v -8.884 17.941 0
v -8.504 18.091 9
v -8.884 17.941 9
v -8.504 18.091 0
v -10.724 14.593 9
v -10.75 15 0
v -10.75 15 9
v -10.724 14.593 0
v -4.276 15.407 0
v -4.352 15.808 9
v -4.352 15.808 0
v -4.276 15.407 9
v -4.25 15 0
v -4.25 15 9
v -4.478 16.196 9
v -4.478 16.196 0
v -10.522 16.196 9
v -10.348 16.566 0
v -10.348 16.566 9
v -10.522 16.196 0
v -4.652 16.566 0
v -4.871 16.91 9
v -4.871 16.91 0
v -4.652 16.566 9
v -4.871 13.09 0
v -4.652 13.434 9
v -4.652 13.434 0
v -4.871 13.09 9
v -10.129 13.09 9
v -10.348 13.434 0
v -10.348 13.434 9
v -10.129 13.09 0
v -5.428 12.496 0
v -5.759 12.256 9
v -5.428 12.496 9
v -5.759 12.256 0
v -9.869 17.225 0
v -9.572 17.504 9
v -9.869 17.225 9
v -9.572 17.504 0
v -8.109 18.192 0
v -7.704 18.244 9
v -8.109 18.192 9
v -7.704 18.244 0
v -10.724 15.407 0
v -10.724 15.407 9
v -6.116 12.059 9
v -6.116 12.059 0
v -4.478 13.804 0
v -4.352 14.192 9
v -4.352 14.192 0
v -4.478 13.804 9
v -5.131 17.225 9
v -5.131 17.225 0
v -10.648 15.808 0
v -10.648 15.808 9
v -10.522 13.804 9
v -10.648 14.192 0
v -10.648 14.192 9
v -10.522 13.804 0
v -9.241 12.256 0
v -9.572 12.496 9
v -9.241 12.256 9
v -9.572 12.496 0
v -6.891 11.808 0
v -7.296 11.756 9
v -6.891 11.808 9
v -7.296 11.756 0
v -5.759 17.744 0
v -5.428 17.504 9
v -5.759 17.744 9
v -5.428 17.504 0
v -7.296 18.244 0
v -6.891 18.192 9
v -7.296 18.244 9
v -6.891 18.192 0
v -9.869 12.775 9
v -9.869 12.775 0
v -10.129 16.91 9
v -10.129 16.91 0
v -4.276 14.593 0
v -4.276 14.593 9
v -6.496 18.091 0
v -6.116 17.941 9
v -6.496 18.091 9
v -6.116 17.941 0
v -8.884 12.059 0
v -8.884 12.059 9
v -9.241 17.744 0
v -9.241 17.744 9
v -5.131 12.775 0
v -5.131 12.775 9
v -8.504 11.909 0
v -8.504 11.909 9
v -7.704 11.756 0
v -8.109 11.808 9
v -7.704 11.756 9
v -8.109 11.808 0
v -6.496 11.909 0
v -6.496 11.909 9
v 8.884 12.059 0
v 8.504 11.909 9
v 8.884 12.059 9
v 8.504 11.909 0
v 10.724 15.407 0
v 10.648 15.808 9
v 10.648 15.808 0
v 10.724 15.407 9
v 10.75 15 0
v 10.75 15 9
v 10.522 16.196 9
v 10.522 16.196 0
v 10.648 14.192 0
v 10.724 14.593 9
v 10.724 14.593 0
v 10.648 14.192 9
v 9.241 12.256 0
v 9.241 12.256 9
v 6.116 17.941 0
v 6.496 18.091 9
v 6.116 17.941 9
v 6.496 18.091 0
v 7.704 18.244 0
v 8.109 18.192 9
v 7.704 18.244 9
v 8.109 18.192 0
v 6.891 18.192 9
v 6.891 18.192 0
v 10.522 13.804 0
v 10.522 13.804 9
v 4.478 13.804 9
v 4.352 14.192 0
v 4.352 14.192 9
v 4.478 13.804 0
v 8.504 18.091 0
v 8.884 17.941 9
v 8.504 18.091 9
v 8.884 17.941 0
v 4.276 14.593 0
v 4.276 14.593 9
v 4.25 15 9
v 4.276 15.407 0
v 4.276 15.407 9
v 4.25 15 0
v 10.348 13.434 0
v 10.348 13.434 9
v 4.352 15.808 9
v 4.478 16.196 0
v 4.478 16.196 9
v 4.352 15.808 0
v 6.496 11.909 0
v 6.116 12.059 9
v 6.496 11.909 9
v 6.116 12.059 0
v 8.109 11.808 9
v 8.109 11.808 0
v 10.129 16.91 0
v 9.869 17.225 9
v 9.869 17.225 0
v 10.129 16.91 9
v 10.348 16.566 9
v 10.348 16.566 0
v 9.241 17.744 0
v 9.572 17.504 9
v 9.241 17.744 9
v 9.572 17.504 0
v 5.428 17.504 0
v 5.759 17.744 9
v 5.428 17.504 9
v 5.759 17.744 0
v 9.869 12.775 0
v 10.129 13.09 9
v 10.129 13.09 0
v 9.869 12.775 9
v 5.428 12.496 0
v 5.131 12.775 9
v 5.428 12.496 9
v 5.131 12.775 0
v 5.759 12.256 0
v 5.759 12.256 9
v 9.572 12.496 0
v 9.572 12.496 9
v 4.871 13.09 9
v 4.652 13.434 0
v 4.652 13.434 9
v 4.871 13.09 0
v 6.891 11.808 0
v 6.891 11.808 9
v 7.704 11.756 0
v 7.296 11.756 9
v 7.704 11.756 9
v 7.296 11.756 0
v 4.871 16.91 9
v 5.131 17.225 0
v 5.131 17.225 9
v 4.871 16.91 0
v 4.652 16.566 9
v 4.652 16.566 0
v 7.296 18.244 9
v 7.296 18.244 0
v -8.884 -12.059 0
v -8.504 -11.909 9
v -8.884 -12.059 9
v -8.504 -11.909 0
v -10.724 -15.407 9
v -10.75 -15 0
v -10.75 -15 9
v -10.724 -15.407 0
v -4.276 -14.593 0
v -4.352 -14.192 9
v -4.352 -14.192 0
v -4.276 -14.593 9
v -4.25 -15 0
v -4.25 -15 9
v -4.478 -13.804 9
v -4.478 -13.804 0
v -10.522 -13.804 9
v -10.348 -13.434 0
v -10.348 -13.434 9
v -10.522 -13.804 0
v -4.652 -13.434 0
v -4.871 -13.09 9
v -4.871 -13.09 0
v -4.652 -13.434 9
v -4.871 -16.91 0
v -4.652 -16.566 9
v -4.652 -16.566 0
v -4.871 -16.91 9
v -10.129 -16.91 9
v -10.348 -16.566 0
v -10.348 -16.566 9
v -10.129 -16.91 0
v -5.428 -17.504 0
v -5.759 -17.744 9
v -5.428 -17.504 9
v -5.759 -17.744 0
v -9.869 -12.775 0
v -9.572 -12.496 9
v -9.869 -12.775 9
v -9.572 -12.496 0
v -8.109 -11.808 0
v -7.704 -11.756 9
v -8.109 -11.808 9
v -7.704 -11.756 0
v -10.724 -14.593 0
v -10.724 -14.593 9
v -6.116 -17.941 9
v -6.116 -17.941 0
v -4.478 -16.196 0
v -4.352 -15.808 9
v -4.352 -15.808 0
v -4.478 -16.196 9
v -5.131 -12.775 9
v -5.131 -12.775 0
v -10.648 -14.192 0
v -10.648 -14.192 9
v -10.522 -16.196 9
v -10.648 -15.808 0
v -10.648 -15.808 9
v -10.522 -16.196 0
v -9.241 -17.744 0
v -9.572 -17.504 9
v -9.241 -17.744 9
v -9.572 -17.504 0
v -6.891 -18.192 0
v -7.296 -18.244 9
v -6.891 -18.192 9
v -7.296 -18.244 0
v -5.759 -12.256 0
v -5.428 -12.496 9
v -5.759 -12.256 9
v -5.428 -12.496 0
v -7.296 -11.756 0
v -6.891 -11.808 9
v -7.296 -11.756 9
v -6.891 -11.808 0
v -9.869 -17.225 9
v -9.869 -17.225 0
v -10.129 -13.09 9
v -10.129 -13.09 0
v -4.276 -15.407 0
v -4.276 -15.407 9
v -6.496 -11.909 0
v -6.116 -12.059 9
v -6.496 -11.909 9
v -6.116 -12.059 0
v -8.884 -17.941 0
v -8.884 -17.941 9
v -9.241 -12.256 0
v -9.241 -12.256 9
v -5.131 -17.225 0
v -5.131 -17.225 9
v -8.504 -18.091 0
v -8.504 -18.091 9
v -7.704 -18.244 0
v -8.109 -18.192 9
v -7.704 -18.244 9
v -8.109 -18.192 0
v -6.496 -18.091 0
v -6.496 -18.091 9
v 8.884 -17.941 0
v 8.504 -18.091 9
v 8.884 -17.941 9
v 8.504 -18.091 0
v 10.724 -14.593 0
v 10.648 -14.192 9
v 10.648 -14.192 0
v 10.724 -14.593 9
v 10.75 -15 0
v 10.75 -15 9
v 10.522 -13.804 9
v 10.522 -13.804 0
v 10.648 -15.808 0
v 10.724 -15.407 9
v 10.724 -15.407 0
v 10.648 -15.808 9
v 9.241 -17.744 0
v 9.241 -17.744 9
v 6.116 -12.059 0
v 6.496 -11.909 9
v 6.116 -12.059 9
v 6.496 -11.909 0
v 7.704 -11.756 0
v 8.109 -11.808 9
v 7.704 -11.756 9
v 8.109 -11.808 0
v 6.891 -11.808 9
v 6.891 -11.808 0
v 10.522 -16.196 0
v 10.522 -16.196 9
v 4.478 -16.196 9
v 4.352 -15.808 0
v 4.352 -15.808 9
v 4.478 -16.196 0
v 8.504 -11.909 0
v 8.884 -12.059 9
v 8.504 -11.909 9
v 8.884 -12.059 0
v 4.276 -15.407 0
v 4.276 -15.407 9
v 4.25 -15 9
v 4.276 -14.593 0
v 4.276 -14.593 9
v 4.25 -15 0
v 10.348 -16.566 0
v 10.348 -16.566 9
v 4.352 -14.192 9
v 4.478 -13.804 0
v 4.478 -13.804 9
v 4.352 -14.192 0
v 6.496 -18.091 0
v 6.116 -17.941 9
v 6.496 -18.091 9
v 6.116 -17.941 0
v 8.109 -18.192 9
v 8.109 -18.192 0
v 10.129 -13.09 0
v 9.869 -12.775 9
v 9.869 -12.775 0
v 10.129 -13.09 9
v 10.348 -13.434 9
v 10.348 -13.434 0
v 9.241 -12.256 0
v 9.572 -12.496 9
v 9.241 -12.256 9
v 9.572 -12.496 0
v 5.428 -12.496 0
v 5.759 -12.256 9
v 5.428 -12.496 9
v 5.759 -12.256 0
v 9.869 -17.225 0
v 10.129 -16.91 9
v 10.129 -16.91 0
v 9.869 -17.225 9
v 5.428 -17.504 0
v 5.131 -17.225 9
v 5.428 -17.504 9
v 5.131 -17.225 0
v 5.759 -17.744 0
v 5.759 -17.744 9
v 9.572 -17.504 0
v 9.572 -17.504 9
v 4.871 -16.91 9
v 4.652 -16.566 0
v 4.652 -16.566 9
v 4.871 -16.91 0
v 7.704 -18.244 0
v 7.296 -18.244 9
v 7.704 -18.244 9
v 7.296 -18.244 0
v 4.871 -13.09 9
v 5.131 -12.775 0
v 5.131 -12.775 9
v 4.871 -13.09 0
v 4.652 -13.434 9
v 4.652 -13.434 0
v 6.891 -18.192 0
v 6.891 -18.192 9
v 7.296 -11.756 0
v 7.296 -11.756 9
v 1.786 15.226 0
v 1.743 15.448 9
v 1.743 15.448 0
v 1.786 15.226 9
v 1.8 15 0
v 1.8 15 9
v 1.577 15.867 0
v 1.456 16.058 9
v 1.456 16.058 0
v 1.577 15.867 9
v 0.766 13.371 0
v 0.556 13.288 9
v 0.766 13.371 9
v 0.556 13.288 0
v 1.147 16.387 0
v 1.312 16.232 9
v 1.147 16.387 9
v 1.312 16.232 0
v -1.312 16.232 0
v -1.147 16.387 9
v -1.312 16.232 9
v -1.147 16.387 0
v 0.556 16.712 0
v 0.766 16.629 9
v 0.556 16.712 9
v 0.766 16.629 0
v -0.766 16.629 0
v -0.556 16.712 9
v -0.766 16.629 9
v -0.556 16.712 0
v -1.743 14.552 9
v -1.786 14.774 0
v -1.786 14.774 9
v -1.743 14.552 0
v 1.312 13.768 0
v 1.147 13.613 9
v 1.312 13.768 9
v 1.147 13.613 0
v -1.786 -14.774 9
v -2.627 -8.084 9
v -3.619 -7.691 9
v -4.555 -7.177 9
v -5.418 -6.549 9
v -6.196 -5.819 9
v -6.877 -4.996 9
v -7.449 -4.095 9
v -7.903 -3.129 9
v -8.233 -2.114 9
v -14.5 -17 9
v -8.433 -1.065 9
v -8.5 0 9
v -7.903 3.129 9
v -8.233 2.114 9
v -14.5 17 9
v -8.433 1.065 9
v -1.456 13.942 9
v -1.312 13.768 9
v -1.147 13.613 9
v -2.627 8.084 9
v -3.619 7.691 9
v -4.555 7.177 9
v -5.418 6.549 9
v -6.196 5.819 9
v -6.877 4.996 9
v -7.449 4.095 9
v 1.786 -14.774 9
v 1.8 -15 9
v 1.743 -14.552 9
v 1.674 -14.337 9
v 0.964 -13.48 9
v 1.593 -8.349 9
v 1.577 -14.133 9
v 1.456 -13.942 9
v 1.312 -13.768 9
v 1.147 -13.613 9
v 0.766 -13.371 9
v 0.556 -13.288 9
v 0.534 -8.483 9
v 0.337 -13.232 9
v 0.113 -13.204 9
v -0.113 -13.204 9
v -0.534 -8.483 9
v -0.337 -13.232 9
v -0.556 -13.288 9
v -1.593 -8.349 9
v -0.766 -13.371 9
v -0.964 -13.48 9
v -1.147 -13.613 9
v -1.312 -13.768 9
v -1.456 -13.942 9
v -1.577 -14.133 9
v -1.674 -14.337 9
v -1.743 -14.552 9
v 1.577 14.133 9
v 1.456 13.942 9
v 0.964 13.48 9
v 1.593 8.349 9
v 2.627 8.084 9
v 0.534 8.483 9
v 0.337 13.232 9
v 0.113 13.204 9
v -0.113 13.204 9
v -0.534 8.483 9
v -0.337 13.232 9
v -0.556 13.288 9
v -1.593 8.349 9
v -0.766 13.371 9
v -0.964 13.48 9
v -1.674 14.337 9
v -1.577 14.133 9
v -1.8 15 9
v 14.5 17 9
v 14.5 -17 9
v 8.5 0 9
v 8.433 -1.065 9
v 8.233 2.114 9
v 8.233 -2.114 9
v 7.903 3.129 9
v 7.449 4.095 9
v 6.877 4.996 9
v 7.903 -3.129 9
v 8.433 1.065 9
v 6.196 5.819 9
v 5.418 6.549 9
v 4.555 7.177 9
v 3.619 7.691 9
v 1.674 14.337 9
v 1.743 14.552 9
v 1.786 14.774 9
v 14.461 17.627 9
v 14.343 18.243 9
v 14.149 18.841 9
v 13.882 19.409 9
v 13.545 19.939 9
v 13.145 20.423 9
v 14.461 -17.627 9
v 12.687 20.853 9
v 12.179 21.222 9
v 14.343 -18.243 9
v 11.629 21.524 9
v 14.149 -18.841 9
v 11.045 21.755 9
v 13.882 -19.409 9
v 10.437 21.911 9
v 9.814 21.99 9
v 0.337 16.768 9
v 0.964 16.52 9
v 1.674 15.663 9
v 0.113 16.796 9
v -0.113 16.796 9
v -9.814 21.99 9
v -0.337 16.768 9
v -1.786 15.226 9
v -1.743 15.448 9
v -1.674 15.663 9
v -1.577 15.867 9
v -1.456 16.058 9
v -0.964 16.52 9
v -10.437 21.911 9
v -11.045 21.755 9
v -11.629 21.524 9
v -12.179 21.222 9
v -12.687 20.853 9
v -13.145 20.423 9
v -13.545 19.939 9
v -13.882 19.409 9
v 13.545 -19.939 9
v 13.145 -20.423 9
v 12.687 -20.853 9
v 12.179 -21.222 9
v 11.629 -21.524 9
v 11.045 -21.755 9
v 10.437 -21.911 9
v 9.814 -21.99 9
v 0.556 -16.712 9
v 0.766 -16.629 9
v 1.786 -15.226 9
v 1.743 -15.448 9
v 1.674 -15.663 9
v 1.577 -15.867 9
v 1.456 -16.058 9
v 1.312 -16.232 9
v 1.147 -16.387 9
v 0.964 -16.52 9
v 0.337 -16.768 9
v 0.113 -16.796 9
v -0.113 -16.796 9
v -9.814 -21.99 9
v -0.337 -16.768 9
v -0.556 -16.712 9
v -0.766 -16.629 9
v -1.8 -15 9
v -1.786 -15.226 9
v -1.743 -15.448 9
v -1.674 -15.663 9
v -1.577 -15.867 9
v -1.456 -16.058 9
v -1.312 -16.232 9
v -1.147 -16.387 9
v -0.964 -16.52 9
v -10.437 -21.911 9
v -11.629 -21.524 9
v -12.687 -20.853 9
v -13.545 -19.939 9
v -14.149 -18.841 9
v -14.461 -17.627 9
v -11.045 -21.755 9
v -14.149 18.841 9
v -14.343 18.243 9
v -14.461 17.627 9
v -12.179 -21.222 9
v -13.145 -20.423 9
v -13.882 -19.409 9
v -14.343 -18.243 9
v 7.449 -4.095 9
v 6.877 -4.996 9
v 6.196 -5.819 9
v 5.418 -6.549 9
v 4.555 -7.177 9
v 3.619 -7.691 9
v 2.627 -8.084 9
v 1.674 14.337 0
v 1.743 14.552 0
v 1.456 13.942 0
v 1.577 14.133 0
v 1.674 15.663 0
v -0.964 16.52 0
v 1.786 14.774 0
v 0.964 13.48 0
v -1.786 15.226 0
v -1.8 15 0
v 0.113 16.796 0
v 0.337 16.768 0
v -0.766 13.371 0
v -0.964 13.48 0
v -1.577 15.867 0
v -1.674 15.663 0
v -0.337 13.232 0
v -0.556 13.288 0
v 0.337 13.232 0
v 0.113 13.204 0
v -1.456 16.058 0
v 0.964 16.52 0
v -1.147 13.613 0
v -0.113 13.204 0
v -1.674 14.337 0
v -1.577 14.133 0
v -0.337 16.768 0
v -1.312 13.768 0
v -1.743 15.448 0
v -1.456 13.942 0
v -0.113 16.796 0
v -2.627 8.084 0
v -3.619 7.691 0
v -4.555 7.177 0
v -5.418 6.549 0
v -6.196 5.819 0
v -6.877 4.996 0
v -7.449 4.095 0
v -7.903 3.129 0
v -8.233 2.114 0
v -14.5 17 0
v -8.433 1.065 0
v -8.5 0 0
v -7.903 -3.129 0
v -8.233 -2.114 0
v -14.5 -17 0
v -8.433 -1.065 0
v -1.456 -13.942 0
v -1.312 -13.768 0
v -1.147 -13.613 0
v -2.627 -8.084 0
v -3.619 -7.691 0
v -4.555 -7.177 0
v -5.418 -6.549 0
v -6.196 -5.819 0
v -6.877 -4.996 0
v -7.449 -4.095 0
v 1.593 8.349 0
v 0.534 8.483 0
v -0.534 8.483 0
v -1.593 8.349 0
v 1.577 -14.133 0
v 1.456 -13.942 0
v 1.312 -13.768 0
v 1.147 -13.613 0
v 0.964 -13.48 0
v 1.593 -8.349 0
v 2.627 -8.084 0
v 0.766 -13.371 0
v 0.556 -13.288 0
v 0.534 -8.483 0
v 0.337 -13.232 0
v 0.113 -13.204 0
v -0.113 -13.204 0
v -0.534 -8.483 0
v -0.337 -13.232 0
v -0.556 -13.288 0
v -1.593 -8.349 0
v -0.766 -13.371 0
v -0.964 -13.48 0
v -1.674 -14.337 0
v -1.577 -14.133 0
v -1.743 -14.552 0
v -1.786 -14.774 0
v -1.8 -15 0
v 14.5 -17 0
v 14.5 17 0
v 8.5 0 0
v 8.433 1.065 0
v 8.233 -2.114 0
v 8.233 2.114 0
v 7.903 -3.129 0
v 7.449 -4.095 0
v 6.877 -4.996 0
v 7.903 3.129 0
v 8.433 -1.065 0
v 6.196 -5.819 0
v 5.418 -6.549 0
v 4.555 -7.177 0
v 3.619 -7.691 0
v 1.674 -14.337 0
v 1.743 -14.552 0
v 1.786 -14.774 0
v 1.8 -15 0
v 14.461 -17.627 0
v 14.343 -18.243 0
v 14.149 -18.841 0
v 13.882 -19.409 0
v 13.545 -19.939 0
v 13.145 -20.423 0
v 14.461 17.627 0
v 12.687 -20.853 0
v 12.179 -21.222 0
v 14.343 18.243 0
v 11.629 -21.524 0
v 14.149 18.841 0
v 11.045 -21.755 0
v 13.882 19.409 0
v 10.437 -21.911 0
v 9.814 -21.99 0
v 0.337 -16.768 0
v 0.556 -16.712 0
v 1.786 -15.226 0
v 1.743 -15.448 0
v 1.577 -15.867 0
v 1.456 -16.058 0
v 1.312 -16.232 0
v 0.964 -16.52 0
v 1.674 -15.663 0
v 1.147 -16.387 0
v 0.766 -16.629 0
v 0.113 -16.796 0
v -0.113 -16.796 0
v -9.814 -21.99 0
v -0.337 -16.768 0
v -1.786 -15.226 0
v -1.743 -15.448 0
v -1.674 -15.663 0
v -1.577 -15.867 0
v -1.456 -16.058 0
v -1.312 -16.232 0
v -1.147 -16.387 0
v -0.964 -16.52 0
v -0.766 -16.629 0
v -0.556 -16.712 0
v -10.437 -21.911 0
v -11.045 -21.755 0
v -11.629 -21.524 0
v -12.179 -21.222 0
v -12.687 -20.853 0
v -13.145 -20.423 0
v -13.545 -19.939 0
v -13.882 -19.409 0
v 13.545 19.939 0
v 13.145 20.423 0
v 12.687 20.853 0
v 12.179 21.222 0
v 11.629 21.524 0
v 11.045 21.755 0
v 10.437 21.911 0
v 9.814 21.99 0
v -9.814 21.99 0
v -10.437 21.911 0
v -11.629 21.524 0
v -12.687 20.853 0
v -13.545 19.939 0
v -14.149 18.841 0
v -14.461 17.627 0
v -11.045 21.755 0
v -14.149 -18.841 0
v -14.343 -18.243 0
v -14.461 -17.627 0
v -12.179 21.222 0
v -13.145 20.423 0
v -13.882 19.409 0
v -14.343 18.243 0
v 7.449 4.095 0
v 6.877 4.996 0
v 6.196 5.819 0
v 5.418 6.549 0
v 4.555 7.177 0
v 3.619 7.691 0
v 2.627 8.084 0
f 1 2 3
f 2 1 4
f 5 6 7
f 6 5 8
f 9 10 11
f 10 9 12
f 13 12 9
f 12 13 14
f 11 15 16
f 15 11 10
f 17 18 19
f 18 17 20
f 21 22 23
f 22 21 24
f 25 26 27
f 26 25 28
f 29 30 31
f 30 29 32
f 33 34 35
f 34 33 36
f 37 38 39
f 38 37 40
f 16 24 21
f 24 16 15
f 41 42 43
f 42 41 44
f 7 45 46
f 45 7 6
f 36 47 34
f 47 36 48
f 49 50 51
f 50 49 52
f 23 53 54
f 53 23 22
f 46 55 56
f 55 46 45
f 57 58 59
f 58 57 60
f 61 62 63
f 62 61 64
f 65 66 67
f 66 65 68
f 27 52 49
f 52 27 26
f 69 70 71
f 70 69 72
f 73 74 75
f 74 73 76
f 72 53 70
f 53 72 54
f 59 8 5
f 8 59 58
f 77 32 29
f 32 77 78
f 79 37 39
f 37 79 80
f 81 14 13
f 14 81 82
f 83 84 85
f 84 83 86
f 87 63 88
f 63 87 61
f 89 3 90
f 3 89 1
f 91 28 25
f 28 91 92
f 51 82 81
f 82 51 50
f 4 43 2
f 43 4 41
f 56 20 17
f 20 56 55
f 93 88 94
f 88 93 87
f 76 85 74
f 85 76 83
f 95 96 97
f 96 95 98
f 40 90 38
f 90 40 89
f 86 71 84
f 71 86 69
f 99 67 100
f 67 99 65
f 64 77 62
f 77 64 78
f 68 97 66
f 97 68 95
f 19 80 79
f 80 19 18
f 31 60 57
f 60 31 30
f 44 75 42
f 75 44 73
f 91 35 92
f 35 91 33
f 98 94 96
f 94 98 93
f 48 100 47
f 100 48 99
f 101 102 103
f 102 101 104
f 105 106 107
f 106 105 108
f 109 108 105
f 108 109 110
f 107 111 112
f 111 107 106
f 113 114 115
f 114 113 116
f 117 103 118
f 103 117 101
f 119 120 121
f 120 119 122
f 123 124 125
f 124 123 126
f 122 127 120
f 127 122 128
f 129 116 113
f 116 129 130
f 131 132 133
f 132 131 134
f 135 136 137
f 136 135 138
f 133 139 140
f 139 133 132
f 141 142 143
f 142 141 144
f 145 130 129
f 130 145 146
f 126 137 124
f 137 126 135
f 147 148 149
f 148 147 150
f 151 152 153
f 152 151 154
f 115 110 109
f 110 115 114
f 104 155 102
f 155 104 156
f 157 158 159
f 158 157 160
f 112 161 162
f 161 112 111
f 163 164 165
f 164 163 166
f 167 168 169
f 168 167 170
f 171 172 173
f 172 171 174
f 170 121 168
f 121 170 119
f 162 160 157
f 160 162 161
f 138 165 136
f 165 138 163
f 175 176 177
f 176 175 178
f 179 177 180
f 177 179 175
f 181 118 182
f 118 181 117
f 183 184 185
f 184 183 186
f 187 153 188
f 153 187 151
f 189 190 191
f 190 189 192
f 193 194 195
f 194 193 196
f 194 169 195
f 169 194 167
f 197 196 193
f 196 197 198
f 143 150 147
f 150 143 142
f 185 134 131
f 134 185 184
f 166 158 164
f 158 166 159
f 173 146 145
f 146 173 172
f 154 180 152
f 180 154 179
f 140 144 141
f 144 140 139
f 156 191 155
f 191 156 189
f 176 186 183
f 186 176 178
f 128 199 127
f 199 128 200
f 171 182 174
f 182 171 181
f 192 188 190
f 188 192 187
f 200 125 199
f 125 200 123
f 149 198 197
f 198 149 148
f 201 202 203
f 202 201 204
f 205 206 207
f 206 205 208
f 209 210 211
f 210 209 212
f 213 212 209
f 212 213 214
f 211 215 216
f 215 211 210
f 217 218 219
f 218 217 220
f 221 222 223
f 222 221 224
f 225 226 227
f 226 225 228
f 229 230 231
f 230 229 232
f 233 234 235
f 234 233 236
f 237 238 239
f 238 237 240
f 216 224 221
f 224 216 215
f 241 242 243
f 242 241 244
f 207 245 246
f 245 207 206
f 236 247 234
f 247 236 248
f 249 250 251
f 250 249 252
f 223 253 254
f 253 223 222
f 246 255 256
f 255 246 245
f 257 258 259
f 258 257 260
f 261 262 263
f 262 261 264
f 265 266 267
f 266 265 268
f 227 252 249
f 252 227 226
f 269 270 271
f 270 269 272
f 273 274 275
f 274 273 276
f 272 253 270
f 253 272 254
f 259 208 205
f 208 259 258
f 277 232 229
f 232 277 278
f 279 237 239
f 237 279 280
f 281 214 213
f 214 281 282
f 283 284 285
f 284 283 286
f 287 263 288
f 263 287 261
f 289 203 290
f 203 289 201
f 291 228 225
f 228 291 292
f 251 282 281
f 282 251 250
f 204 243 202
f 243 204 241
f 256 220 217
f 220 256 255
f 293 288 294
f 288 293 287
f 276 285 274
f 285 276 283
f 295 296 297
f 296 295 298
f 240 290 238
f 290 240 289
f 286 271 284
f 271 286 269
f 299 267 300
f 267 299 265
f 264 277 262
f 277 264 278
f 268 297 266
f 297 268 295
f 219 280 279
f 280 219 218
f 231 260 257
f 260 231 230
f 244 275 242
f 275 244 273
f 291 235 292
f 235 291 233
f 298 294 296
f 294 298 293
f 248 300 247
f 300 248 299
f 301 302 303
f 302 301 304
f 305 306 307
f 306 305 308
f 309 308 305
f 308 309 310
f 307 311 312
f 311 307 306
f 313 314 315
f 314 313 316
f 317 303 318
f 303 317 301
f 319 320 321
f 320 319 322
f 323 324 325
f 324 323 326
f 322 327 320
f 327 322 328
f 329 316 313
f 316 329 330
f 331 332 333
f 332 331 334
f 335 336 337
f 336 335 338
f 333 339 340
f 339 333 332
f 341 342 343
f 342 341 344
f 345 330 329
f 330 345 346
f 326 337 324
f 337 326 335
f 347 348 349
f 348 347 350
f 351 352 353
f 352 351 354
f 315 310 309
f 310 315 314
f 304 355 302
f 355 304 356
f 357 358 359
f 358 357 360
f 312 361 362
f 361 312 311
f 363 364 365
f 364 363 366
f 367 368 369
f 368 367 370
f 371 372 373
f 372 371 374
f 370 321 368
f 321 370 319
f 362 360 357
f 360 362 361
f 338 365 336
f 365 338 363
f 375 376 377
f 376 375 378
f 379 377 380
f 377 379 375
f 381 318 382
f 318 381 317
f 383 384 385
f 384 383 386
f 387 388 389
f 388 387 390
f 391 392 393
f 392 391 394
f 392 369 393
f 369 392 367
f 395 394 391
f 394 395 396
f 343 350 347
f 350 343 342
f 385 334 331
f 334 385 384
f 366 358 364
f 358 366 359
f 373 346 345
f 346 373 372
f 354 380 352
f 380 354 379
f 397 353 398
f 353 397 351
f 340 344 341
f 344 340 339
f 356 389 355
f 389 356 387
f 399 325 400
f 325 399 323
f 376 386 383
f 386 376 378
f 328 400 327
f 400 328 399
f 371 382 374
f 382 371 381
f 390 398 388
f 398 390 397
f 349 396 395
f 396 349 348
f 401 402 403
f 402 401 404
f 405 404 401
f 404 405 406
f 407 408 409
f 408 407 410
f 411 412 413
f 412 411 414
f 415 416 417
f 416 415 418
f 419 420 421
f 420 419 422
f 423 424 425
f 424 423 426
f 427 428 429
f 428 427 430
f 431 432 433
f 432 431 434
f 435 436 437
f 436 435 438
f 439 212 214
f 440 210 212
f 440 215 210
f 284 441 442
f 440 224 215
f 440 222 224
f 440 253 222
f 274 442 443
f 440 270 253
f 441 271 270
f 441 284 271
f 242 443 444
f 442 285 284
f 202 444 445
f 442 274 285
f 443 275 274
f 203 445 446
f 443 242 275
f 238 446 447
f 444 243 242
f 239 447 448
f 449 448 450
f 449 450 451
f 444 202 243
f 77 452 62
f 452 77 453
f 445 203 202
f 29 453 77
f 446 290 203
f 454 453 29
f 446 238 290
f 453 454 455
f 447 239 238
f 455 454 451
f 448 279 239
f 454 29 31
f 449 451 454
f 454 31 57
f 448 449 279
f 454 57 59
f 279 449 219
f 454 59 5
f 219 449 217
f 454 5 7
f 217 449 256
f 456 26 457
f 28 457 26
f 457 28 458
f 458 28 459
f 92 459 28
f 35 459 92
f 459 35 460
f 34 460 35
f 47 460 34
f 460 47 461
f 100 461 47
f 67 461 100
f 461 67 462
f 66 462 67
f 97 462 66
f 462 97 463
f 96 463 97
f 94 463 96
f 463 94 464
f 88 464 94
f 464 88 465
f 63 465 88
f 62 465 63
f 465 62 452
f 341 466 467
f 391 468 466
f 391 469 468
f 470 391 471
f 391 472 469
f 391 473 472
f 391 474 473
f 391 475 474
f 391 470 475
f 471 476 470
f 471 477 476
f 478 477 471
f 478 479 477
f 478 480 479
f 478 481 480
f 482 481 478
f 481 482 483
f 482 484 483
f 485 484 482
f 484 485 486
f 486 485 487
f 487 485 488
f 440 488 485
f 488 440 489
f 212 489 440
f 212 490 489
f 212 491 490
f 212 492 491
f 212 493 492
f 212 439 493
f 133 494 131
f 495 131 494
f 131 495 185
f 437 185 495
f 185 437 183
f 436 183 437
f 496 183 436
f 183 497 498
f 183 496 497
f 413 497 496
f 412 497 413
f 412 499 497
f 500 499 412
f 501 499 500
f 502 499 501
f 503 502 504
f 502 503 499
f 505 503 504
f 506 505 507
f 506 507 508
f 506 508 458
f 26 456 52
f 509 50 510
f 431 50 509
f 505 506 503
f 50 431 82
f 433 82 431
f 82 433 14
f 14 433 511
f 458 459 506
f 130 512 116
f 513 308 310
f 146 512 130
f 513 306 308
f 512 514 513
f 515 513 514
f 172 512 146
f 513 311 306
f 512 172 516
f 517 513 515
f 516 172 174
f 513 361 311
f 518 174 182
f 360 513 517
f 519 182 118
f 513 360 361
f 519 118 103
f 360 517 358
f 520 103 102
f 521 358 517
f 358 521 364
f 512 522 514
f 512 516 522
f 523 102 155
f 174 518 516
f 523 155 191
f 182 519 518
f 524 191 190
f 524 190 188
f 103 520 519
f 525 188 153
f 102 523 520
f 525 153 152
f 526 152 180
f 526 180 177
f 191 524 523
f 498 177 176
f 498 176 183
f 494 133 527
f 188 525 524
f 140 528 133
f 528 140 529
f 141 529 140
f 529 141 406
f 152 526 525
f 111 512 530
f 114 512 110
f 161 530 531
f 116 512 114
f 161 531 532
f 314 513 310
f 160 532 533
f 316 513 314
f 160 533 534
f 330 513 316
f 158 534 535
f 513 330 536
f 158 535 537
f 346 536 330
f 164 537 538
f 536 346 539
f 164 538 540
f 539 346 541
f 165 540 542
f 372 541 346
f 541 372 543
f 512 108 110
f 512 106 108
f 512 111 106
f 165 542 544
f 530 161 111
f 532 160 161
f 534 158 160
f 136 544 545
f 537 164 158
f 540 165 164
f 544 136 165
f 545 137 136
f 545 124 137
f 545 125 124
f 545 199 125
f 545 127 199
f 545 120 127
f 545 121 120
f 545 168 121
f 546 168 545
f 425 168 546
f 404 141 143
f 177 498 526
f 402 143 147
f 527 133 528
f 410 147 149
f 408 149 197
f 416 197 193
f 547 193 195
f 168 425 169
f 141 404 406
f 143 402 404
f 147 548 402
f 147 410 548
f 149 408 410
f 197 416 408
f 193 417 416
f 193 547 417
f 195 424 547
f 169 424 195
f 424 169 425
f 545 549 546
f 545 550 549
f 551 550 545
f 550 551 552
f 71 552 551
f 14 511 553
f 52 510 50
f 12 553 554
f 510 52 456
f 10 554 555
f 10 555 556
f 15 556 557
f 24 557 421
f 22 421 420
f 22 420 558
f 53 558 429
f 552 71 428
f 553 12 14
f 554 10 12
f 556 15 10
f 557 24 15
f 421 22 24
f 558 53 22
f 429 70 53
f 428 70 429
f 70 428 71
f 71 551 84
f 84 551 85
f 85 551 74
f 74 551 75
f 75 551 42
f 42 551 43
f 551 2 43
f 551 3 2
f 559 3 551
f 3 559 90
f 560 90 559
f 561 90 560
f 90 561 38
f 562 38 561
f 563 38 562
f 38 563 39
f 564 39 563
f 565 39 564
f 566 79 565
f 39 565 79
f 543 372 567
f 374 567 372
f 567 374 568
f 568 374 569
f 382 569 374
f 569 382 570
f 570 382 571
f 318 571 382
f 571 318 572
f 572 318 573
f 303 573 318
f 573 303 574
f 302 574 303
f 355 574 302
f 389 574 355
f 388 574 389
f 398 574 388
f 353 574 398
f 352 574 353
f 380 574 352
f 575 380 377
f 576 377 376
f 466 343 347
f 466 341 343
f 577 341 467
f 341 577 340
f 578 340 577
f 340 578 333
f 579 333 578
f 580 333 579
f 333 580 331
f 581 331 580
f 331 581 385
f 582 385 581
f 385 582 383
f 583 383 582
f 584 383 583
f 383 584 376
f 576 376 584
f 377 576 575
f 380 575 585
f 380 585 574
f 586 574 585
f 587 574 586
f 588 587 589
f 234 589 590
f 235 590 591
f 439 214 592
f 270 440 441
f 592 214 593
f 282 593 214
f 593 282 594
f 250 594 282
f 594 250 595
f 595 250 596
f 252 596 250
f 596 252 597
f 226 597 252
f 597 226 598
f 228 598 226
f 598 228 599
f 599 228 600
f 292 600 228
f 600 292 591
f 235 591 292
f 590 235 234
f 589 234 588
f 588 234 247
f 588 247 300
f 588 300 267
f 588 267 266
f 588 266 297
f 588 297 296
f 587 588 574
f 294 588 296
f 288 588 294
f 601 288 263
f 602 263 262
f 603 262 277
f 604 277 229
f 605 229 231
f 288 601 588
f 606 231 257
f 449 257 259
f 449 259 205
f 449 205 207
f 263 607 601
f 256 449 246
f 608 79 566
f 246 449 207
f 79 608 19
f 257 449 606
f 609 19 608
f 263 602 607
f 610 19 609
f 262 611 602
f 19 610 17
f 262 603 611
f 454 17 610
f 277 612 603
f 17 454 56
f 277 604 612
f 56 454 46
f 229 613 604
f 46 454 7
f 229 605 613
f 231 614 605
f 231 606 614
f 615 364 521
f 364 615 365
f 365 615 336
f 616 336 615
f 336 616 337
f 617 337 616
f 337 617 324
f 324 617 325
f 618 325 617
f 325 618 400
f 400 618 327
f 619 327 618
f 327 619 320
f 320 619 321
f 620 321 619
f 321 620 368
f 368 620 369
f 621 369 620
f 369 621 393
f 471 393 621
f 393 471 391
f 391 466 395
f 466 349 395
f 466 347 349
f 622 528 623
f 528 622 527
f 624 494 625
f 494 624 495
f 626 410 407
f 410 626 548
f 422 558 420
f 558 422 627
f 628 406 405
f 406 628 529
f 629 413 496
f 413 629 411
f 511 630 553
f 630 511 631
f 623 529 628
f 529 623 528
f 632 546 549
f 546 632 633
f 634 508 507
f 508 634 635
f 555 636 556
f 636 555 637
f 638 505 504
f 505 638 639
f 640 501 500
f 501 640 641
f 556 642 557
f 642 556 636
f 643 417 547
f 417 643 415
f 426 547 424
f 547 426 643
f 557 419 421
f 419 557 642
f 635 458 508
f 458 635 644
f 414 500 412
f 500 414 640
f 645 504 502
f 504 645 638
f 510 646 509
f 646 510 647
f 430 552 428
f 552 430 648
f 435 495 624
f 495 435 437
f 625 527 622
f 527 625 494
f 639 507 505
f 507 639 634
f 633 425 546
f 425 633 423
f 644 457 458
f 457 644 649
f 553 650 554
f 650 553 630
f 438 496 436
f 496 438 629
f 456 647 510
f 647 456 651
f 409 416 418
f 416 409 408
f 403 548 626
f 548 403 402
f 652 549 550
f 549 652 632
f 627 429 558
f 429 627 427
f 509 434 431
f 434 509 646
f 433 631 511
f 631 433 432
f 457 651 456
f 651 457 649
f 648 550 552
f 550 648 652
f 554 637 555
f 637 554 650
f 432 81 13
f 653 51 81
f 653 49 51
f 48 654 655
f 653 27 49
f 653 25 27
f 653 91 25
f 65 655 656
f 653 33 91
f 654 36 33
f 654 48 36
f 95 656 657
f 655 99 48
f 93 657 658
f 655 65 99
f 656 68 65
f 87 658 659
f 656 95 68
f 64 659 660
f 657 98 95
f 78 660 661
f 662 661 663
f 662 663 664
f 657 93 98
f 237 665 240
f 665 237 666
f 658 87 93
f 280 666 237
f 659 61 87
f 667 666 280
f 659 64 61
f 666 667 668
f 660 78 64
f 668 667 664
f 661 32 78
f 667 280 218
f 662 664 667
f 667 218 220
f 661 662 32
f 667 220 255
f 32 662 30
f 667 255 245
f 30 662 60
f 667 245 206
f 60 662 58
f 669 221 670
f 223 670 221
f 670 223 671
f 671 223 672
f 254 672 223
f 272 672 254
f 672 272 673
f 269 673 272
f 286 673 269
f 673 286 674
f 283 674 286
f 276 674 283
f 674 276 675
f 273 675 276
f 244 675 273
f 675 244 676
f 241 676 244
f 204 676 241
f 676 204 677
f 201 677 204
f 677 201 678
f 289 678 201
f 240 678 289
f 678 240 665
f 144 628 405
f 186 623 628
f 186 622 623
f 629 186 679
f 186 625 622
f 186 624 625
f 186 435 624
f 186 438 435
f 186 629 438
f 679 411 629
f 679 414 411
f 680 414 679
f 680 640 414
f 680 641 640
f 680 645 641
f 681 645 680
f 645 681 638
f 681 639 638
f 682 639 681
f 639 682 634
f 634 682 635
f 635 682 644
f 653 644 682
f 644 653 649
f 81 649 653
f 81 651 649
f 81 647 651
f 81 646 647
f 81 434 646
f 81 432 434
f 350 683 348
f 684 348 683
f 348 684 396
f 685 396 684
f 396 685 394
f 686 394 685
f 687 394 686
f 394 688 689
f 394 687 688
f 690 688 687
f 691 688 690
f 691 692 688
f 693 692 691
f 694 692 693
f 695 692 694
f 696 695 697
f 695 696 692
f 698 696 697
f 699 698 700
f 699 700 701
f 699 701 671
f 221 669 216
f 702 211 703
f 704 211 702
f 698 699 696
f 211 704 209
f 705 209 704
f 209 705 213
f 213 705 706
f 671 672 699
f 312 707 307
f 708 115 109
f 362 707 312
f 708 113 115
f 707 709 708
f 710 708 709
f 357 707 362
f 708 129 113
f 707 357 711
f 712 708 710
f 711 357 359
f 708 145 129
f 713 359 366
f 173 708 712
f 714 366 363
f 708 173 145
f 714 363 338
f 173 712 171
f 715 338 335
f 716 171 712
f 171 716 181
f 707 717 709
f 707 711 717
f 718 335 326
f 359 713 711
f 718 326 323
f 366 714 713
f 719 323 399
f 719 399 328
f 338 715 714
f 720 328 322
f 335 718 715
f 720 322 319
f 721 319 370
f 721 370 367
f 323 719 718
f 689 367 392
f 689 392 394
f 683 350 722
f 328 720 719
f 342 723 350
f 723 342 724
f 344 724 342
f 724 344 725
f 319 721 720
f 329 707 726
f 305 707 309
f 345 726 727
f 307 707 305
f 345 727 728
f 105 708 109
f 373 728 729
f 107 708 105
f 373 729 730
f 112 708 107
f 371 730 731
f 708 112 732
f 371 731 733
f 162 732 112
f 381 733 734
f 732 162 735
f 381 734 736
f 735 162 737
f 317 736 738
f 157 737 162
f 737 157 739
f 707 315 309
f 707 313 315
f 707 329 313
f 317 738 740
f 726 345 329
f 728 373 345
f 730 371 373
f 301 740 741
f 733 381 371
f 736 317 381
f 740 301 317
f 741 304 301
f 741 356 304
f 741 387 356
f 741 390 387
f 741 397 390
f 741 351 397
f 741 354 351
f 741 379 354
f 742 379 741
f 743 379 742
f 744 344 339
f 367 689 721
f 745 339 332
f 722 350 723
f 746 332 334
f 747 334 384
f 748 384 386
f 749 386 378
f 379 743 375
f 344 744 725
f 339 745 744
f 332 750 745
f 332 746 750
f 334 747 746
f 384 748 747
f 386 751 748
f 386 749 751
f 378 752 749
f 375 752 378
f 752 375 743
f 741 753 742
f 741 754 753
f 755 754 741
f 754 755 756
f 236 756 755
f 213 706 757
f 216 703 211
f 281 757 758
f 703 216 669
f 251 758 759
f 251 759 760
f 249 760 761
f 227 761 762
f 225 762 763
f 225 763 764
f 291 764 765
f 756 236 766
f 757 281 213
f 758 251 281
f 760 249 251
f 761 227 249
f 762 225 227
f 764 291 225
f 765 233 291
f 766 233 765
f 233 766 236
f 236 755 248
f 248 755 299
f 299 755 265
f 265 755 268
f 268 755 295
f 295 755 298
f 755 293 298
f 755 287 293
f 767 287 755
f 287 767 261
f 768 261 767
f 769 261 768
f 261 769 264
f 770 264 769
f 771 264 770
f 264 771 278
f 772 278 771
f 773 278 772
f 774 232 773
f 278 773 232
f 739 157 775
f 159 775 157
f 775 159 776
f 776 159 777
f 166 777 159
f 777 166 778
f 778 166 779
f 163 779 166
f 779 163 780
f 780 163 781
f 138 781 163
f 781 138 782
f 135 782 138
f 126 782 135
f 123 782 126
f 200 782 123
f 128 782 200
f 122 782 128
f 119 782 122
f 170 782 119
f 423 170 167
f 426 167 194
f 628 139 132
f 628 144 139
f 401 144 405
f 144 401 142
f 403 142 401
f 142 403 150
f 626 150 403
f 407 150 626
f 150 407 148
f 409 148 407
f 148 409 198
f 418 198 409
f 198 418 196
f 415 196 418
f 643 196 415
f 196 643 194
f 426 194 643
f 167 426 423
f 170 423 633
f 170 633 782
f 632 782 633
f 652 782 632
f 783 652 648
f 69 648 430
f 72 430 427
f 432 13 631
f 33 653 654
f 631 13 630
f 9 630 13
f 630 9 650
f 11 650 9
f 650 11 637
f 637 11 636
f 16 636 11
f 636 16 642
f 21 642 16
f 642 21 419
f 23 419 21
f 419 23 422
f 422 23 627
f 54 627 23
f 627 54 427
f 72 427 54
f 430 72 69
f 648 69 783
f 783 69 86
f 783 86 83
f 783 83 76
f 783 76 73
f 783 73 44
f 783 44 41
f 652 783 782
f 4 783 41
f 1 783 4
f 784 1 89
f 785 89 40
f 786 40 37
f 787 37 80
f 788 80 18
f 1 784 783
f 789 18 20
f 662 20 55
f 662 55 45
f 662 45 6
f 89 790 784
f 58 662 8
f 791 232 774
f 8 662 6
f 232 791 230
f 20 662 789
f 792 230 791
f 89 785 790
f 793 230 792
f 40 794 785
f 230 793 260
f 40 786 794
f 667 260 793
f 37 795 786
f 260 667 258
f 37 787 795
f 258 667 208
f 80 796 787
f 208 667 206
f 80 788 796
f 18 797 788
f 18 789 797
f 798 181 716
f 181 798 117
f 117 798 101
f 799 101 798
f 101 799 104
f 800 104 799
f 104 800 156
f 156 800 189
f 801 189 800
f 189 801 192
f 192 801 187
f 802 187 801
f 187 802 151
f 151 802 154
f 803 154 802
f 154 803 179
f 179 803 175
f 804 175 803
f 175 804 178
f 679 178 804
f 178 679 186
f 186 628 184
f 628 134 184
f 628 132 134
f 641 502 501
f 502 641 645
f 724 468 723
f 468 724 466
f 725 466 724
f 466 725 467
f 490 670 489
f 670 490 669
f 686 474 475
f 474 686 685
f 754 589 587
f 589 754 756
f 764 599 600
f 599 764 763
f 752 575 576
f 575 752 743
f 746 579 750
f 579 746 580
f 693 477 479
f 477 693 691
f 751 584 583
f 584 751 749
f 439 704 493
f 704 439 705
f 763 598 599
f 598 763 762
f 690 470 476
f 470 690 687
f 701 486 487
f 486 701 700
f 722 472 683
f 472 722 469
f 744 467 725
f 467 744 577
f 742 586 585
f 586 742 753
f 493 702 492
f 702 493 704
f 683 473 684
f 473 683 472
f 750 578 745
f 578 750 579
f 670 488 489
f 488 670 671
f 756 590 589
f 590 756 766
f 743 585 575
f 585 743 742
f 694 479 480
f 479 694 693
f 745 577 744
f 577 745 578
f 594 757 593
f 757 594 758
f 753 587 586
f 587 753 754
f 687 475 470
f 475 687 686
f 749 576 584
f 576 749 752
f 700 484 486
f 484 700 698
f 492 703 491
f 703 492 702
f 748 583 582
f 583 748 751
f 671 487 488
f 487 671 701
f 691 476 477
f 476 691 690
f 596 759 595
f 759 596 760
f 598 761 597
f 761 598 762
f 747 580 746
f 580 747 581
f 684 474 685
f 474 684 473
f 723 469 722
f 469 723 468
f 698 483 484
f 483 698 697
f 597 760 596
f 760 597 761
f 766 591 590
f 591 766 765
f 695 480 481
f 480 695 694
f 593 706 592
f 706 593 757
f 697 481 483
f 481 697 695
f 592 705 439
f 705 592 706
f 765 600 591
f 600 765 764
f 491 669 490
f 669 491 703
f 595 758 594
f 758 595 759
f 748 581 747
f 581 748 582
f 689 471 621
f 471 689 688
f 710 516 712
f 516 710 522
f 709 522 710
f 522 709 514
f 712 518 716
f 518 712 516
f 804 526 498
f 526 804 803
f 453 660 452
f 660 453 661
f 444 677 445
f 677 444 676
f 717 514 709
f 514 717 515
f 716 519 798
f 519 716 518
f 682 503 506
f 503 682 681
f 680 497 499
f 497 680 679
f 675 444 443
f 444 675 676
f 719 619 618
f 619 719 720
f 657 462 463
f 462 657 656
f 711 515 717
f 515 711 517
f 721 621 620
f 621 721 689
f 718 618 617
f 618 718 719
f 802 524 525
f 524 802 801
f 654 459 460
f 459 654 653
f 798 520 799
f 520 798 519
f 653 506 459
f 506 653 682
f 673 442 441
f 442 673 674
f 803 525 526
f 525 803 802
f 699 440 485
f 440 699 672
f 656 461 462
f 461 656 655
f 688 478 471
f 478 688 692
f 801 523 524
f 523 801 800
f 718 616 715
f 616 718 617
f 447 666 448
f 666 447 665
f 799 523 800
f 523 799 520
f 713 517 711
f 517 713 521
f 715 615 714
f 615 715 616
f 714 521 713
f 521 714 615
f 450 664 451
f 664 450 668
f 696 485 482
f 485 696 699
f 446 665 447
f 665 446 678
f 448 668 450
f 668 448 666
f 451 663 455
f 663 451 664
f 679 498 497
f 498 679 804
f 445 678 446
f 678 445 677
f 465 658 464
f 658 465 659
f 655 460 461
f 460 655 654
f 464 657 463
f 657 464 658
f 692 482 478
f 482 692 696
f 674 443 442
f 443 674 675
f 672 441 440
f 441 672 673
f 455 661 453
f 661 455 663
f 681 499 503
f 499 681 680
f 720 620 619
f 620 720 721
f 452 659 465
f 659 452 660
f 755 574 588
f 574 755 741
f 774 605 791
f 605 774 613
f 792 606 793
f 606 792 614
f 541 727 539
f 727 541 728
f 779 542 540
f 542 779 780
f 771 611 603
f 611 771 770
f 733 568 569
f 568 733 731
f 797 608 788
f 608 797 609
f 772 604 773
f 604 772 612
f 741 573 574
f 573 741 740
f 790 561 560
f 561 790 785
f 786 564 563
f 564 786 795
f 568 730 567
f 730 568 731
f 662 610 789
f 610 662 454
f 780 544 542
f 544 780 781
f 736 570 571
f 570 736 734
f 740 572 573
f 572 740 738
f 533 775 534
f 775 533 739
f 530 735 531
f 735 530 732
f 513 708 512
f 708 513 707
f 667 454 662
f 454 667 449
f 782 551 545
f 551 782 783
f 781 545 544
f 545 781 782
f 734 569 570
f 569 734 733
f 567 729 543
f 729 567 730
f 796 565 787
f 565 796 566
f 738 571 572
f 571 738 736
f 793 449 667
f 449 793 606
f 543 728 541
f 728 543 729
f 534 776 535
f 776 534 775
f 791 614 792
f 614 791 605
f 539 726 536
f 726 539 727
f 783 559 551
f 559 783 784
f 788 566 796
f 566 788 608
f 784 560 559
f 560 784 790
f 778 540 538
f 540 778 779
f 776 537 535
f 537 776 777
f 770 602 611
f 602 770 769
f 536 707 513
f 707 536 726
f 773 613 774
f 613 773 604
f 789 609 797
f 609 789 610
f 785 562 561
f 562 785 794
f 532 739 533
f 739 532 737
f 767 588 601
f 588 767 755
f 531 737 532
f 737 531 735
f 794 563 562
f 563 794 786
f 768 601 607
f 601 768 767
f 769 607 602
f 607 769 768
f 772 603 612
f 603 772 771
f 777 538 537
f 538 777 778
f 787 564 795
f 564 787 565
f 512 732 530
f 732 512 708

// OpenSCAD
$fn = 50;


difference() {
	union() {
		hull() {
			translate(v = [-9.5000000000, 17.0000000000, 0]) {
				cylinder(h = 9, r = 5);
			}
			translate(v = [9.5000000000, 17.0000000000, 0]) {
				cylinder(h = 9, r = 5);
			}
			translate(v = [-9.5000000000, -17.0000000000, 0]) {
				cylinder(h = 9, r = 5);
			}
			translate(v = [9.5000000000, -17.0000000000, 0]) {
				cylinder(h = 9, r = 5);
			}
		}
	}
	union() {
		#translate(v = [-7.5000000000, 15.0000000000, 0]) {
			cylinder(h = 9, r = 3.2500000000);
		}
		#translate(v = [7.5000000000, 15.0000000000, 0]) {
			cylinder(h = 9, r = 3.2500000000);
		}
		#translate(v = [-7.5000000000, -15.0000000000, 0]) {
			cylinder(h = 9, r = 3.2500000000);
		}
		#translate(v = [7.5000000000, -15.0000000000, 0]) {
			cylinder(h = 9, r = 3.2500000000);
		}
		#translate(v = [-7.5000000000, -15.0000000000, -100.0000000000]) {
			cylinder(h = 200, r = 3.2500000000);
		}
		#translate(v = [-7.5000000000, 15.0000000000, -100.0000000000]) {
			cylinder(h = 200, r = 3.2500000000);
		}
		#translate(v = [7.5000000000, -15.0000000000, -100.0000000000]) {
			cylinder(h = 200, r = 3.2500000000);
		}
		#translate(v = [7.5000000000, 15.0000000000, -100.0000000000]) {
			cylinder(h = 200, r = 3.2500000000);
		}
		#translate(v = [-7.5000000000, 15.0000000000, 0]) {
			cylinder(h = 9, r = 1.8000000000);
		}
		#translate(v = [0.0000000000, 15.0000000000, 0]) {
			cylinder(h = 9, r = 1.8000000000);
		}
		#translate(v = [7.5000000000, 15.0000000000, 0]) {
			cylinder(h = 9, r = 1.8000000000);
		}
		#translate(v = [-7.5000000000, -15.0000000000, 0]) {
			cylinder(h = 9, r = 1.8000000000);
		}
		#translate(v = [0.0000000000, -15.0000000000, 0]) {
			cylinder(h = 9, r = 1.8000000000);
		}
		#translate(v = [7.5000000000, -15.0000000000, 0]) {
			cylinder(h = 9, r = 1.8000000000);
		}
		#translate(v = [-7.5000000000, 15.0000000000, 0]) {
			cylinder(h = 9, r = 1.8000000000);
		}
		#translate(v = [0.0000000000, 15.0000000000, 0]) {
			cylinder(h = 9, r = 1.8000000000);
		}
		#translate(v = [7.5000000000, 15.0000000000, 0]) {
			cylinder(h = 9, r = 1.8000000000);
		}
		#translate(v = [-7.5000000000, -15.0000000000, 0]) {
			cylinder(h = 9, r = 1.8000000000);
		}
		#translate(v = [0.0000000000, -15.0000000000, 0]) {
			cylinder(h = 9, r = 1.8000000000);
		}
		#translate(v = [7.5000000000, -15.0000000000, 0]) {
			cylinder(h = 9, r = 1.8000000000);
		}
		#translate(v = [-7.5000000000, 15.0000000000, 0]) {
			cylinder(h = 9, r = 1.8000000000);
		}
		#translate(v = [0.0000000000, 15.0000000000, 0]) {
			cylinder(h = 9, r = 1.8000000000);
		}
		#translate(v = [7.5000000000, 15.0000000000, 0]) {
			cylinder(h = 9, r = 1.8000000000);
		}
		#translate(v = [-7.5000000000, -15.0000000000, 0]) {
			cylinder(h = 9, r = 1.8000000000);
		}
		#translate(v = [0.0000000000, -15.0000000000, 0]) {
			cylinder(h = 9, r = 1.8000000000);
		}
		#translate(v = [7.5000000000, -15.0000000000, 0]) {
			cylinder(h = 9, r = 1.8000000000);
		}
		#cylinder(h = 9, r = 8.5000000000);
	}
}
